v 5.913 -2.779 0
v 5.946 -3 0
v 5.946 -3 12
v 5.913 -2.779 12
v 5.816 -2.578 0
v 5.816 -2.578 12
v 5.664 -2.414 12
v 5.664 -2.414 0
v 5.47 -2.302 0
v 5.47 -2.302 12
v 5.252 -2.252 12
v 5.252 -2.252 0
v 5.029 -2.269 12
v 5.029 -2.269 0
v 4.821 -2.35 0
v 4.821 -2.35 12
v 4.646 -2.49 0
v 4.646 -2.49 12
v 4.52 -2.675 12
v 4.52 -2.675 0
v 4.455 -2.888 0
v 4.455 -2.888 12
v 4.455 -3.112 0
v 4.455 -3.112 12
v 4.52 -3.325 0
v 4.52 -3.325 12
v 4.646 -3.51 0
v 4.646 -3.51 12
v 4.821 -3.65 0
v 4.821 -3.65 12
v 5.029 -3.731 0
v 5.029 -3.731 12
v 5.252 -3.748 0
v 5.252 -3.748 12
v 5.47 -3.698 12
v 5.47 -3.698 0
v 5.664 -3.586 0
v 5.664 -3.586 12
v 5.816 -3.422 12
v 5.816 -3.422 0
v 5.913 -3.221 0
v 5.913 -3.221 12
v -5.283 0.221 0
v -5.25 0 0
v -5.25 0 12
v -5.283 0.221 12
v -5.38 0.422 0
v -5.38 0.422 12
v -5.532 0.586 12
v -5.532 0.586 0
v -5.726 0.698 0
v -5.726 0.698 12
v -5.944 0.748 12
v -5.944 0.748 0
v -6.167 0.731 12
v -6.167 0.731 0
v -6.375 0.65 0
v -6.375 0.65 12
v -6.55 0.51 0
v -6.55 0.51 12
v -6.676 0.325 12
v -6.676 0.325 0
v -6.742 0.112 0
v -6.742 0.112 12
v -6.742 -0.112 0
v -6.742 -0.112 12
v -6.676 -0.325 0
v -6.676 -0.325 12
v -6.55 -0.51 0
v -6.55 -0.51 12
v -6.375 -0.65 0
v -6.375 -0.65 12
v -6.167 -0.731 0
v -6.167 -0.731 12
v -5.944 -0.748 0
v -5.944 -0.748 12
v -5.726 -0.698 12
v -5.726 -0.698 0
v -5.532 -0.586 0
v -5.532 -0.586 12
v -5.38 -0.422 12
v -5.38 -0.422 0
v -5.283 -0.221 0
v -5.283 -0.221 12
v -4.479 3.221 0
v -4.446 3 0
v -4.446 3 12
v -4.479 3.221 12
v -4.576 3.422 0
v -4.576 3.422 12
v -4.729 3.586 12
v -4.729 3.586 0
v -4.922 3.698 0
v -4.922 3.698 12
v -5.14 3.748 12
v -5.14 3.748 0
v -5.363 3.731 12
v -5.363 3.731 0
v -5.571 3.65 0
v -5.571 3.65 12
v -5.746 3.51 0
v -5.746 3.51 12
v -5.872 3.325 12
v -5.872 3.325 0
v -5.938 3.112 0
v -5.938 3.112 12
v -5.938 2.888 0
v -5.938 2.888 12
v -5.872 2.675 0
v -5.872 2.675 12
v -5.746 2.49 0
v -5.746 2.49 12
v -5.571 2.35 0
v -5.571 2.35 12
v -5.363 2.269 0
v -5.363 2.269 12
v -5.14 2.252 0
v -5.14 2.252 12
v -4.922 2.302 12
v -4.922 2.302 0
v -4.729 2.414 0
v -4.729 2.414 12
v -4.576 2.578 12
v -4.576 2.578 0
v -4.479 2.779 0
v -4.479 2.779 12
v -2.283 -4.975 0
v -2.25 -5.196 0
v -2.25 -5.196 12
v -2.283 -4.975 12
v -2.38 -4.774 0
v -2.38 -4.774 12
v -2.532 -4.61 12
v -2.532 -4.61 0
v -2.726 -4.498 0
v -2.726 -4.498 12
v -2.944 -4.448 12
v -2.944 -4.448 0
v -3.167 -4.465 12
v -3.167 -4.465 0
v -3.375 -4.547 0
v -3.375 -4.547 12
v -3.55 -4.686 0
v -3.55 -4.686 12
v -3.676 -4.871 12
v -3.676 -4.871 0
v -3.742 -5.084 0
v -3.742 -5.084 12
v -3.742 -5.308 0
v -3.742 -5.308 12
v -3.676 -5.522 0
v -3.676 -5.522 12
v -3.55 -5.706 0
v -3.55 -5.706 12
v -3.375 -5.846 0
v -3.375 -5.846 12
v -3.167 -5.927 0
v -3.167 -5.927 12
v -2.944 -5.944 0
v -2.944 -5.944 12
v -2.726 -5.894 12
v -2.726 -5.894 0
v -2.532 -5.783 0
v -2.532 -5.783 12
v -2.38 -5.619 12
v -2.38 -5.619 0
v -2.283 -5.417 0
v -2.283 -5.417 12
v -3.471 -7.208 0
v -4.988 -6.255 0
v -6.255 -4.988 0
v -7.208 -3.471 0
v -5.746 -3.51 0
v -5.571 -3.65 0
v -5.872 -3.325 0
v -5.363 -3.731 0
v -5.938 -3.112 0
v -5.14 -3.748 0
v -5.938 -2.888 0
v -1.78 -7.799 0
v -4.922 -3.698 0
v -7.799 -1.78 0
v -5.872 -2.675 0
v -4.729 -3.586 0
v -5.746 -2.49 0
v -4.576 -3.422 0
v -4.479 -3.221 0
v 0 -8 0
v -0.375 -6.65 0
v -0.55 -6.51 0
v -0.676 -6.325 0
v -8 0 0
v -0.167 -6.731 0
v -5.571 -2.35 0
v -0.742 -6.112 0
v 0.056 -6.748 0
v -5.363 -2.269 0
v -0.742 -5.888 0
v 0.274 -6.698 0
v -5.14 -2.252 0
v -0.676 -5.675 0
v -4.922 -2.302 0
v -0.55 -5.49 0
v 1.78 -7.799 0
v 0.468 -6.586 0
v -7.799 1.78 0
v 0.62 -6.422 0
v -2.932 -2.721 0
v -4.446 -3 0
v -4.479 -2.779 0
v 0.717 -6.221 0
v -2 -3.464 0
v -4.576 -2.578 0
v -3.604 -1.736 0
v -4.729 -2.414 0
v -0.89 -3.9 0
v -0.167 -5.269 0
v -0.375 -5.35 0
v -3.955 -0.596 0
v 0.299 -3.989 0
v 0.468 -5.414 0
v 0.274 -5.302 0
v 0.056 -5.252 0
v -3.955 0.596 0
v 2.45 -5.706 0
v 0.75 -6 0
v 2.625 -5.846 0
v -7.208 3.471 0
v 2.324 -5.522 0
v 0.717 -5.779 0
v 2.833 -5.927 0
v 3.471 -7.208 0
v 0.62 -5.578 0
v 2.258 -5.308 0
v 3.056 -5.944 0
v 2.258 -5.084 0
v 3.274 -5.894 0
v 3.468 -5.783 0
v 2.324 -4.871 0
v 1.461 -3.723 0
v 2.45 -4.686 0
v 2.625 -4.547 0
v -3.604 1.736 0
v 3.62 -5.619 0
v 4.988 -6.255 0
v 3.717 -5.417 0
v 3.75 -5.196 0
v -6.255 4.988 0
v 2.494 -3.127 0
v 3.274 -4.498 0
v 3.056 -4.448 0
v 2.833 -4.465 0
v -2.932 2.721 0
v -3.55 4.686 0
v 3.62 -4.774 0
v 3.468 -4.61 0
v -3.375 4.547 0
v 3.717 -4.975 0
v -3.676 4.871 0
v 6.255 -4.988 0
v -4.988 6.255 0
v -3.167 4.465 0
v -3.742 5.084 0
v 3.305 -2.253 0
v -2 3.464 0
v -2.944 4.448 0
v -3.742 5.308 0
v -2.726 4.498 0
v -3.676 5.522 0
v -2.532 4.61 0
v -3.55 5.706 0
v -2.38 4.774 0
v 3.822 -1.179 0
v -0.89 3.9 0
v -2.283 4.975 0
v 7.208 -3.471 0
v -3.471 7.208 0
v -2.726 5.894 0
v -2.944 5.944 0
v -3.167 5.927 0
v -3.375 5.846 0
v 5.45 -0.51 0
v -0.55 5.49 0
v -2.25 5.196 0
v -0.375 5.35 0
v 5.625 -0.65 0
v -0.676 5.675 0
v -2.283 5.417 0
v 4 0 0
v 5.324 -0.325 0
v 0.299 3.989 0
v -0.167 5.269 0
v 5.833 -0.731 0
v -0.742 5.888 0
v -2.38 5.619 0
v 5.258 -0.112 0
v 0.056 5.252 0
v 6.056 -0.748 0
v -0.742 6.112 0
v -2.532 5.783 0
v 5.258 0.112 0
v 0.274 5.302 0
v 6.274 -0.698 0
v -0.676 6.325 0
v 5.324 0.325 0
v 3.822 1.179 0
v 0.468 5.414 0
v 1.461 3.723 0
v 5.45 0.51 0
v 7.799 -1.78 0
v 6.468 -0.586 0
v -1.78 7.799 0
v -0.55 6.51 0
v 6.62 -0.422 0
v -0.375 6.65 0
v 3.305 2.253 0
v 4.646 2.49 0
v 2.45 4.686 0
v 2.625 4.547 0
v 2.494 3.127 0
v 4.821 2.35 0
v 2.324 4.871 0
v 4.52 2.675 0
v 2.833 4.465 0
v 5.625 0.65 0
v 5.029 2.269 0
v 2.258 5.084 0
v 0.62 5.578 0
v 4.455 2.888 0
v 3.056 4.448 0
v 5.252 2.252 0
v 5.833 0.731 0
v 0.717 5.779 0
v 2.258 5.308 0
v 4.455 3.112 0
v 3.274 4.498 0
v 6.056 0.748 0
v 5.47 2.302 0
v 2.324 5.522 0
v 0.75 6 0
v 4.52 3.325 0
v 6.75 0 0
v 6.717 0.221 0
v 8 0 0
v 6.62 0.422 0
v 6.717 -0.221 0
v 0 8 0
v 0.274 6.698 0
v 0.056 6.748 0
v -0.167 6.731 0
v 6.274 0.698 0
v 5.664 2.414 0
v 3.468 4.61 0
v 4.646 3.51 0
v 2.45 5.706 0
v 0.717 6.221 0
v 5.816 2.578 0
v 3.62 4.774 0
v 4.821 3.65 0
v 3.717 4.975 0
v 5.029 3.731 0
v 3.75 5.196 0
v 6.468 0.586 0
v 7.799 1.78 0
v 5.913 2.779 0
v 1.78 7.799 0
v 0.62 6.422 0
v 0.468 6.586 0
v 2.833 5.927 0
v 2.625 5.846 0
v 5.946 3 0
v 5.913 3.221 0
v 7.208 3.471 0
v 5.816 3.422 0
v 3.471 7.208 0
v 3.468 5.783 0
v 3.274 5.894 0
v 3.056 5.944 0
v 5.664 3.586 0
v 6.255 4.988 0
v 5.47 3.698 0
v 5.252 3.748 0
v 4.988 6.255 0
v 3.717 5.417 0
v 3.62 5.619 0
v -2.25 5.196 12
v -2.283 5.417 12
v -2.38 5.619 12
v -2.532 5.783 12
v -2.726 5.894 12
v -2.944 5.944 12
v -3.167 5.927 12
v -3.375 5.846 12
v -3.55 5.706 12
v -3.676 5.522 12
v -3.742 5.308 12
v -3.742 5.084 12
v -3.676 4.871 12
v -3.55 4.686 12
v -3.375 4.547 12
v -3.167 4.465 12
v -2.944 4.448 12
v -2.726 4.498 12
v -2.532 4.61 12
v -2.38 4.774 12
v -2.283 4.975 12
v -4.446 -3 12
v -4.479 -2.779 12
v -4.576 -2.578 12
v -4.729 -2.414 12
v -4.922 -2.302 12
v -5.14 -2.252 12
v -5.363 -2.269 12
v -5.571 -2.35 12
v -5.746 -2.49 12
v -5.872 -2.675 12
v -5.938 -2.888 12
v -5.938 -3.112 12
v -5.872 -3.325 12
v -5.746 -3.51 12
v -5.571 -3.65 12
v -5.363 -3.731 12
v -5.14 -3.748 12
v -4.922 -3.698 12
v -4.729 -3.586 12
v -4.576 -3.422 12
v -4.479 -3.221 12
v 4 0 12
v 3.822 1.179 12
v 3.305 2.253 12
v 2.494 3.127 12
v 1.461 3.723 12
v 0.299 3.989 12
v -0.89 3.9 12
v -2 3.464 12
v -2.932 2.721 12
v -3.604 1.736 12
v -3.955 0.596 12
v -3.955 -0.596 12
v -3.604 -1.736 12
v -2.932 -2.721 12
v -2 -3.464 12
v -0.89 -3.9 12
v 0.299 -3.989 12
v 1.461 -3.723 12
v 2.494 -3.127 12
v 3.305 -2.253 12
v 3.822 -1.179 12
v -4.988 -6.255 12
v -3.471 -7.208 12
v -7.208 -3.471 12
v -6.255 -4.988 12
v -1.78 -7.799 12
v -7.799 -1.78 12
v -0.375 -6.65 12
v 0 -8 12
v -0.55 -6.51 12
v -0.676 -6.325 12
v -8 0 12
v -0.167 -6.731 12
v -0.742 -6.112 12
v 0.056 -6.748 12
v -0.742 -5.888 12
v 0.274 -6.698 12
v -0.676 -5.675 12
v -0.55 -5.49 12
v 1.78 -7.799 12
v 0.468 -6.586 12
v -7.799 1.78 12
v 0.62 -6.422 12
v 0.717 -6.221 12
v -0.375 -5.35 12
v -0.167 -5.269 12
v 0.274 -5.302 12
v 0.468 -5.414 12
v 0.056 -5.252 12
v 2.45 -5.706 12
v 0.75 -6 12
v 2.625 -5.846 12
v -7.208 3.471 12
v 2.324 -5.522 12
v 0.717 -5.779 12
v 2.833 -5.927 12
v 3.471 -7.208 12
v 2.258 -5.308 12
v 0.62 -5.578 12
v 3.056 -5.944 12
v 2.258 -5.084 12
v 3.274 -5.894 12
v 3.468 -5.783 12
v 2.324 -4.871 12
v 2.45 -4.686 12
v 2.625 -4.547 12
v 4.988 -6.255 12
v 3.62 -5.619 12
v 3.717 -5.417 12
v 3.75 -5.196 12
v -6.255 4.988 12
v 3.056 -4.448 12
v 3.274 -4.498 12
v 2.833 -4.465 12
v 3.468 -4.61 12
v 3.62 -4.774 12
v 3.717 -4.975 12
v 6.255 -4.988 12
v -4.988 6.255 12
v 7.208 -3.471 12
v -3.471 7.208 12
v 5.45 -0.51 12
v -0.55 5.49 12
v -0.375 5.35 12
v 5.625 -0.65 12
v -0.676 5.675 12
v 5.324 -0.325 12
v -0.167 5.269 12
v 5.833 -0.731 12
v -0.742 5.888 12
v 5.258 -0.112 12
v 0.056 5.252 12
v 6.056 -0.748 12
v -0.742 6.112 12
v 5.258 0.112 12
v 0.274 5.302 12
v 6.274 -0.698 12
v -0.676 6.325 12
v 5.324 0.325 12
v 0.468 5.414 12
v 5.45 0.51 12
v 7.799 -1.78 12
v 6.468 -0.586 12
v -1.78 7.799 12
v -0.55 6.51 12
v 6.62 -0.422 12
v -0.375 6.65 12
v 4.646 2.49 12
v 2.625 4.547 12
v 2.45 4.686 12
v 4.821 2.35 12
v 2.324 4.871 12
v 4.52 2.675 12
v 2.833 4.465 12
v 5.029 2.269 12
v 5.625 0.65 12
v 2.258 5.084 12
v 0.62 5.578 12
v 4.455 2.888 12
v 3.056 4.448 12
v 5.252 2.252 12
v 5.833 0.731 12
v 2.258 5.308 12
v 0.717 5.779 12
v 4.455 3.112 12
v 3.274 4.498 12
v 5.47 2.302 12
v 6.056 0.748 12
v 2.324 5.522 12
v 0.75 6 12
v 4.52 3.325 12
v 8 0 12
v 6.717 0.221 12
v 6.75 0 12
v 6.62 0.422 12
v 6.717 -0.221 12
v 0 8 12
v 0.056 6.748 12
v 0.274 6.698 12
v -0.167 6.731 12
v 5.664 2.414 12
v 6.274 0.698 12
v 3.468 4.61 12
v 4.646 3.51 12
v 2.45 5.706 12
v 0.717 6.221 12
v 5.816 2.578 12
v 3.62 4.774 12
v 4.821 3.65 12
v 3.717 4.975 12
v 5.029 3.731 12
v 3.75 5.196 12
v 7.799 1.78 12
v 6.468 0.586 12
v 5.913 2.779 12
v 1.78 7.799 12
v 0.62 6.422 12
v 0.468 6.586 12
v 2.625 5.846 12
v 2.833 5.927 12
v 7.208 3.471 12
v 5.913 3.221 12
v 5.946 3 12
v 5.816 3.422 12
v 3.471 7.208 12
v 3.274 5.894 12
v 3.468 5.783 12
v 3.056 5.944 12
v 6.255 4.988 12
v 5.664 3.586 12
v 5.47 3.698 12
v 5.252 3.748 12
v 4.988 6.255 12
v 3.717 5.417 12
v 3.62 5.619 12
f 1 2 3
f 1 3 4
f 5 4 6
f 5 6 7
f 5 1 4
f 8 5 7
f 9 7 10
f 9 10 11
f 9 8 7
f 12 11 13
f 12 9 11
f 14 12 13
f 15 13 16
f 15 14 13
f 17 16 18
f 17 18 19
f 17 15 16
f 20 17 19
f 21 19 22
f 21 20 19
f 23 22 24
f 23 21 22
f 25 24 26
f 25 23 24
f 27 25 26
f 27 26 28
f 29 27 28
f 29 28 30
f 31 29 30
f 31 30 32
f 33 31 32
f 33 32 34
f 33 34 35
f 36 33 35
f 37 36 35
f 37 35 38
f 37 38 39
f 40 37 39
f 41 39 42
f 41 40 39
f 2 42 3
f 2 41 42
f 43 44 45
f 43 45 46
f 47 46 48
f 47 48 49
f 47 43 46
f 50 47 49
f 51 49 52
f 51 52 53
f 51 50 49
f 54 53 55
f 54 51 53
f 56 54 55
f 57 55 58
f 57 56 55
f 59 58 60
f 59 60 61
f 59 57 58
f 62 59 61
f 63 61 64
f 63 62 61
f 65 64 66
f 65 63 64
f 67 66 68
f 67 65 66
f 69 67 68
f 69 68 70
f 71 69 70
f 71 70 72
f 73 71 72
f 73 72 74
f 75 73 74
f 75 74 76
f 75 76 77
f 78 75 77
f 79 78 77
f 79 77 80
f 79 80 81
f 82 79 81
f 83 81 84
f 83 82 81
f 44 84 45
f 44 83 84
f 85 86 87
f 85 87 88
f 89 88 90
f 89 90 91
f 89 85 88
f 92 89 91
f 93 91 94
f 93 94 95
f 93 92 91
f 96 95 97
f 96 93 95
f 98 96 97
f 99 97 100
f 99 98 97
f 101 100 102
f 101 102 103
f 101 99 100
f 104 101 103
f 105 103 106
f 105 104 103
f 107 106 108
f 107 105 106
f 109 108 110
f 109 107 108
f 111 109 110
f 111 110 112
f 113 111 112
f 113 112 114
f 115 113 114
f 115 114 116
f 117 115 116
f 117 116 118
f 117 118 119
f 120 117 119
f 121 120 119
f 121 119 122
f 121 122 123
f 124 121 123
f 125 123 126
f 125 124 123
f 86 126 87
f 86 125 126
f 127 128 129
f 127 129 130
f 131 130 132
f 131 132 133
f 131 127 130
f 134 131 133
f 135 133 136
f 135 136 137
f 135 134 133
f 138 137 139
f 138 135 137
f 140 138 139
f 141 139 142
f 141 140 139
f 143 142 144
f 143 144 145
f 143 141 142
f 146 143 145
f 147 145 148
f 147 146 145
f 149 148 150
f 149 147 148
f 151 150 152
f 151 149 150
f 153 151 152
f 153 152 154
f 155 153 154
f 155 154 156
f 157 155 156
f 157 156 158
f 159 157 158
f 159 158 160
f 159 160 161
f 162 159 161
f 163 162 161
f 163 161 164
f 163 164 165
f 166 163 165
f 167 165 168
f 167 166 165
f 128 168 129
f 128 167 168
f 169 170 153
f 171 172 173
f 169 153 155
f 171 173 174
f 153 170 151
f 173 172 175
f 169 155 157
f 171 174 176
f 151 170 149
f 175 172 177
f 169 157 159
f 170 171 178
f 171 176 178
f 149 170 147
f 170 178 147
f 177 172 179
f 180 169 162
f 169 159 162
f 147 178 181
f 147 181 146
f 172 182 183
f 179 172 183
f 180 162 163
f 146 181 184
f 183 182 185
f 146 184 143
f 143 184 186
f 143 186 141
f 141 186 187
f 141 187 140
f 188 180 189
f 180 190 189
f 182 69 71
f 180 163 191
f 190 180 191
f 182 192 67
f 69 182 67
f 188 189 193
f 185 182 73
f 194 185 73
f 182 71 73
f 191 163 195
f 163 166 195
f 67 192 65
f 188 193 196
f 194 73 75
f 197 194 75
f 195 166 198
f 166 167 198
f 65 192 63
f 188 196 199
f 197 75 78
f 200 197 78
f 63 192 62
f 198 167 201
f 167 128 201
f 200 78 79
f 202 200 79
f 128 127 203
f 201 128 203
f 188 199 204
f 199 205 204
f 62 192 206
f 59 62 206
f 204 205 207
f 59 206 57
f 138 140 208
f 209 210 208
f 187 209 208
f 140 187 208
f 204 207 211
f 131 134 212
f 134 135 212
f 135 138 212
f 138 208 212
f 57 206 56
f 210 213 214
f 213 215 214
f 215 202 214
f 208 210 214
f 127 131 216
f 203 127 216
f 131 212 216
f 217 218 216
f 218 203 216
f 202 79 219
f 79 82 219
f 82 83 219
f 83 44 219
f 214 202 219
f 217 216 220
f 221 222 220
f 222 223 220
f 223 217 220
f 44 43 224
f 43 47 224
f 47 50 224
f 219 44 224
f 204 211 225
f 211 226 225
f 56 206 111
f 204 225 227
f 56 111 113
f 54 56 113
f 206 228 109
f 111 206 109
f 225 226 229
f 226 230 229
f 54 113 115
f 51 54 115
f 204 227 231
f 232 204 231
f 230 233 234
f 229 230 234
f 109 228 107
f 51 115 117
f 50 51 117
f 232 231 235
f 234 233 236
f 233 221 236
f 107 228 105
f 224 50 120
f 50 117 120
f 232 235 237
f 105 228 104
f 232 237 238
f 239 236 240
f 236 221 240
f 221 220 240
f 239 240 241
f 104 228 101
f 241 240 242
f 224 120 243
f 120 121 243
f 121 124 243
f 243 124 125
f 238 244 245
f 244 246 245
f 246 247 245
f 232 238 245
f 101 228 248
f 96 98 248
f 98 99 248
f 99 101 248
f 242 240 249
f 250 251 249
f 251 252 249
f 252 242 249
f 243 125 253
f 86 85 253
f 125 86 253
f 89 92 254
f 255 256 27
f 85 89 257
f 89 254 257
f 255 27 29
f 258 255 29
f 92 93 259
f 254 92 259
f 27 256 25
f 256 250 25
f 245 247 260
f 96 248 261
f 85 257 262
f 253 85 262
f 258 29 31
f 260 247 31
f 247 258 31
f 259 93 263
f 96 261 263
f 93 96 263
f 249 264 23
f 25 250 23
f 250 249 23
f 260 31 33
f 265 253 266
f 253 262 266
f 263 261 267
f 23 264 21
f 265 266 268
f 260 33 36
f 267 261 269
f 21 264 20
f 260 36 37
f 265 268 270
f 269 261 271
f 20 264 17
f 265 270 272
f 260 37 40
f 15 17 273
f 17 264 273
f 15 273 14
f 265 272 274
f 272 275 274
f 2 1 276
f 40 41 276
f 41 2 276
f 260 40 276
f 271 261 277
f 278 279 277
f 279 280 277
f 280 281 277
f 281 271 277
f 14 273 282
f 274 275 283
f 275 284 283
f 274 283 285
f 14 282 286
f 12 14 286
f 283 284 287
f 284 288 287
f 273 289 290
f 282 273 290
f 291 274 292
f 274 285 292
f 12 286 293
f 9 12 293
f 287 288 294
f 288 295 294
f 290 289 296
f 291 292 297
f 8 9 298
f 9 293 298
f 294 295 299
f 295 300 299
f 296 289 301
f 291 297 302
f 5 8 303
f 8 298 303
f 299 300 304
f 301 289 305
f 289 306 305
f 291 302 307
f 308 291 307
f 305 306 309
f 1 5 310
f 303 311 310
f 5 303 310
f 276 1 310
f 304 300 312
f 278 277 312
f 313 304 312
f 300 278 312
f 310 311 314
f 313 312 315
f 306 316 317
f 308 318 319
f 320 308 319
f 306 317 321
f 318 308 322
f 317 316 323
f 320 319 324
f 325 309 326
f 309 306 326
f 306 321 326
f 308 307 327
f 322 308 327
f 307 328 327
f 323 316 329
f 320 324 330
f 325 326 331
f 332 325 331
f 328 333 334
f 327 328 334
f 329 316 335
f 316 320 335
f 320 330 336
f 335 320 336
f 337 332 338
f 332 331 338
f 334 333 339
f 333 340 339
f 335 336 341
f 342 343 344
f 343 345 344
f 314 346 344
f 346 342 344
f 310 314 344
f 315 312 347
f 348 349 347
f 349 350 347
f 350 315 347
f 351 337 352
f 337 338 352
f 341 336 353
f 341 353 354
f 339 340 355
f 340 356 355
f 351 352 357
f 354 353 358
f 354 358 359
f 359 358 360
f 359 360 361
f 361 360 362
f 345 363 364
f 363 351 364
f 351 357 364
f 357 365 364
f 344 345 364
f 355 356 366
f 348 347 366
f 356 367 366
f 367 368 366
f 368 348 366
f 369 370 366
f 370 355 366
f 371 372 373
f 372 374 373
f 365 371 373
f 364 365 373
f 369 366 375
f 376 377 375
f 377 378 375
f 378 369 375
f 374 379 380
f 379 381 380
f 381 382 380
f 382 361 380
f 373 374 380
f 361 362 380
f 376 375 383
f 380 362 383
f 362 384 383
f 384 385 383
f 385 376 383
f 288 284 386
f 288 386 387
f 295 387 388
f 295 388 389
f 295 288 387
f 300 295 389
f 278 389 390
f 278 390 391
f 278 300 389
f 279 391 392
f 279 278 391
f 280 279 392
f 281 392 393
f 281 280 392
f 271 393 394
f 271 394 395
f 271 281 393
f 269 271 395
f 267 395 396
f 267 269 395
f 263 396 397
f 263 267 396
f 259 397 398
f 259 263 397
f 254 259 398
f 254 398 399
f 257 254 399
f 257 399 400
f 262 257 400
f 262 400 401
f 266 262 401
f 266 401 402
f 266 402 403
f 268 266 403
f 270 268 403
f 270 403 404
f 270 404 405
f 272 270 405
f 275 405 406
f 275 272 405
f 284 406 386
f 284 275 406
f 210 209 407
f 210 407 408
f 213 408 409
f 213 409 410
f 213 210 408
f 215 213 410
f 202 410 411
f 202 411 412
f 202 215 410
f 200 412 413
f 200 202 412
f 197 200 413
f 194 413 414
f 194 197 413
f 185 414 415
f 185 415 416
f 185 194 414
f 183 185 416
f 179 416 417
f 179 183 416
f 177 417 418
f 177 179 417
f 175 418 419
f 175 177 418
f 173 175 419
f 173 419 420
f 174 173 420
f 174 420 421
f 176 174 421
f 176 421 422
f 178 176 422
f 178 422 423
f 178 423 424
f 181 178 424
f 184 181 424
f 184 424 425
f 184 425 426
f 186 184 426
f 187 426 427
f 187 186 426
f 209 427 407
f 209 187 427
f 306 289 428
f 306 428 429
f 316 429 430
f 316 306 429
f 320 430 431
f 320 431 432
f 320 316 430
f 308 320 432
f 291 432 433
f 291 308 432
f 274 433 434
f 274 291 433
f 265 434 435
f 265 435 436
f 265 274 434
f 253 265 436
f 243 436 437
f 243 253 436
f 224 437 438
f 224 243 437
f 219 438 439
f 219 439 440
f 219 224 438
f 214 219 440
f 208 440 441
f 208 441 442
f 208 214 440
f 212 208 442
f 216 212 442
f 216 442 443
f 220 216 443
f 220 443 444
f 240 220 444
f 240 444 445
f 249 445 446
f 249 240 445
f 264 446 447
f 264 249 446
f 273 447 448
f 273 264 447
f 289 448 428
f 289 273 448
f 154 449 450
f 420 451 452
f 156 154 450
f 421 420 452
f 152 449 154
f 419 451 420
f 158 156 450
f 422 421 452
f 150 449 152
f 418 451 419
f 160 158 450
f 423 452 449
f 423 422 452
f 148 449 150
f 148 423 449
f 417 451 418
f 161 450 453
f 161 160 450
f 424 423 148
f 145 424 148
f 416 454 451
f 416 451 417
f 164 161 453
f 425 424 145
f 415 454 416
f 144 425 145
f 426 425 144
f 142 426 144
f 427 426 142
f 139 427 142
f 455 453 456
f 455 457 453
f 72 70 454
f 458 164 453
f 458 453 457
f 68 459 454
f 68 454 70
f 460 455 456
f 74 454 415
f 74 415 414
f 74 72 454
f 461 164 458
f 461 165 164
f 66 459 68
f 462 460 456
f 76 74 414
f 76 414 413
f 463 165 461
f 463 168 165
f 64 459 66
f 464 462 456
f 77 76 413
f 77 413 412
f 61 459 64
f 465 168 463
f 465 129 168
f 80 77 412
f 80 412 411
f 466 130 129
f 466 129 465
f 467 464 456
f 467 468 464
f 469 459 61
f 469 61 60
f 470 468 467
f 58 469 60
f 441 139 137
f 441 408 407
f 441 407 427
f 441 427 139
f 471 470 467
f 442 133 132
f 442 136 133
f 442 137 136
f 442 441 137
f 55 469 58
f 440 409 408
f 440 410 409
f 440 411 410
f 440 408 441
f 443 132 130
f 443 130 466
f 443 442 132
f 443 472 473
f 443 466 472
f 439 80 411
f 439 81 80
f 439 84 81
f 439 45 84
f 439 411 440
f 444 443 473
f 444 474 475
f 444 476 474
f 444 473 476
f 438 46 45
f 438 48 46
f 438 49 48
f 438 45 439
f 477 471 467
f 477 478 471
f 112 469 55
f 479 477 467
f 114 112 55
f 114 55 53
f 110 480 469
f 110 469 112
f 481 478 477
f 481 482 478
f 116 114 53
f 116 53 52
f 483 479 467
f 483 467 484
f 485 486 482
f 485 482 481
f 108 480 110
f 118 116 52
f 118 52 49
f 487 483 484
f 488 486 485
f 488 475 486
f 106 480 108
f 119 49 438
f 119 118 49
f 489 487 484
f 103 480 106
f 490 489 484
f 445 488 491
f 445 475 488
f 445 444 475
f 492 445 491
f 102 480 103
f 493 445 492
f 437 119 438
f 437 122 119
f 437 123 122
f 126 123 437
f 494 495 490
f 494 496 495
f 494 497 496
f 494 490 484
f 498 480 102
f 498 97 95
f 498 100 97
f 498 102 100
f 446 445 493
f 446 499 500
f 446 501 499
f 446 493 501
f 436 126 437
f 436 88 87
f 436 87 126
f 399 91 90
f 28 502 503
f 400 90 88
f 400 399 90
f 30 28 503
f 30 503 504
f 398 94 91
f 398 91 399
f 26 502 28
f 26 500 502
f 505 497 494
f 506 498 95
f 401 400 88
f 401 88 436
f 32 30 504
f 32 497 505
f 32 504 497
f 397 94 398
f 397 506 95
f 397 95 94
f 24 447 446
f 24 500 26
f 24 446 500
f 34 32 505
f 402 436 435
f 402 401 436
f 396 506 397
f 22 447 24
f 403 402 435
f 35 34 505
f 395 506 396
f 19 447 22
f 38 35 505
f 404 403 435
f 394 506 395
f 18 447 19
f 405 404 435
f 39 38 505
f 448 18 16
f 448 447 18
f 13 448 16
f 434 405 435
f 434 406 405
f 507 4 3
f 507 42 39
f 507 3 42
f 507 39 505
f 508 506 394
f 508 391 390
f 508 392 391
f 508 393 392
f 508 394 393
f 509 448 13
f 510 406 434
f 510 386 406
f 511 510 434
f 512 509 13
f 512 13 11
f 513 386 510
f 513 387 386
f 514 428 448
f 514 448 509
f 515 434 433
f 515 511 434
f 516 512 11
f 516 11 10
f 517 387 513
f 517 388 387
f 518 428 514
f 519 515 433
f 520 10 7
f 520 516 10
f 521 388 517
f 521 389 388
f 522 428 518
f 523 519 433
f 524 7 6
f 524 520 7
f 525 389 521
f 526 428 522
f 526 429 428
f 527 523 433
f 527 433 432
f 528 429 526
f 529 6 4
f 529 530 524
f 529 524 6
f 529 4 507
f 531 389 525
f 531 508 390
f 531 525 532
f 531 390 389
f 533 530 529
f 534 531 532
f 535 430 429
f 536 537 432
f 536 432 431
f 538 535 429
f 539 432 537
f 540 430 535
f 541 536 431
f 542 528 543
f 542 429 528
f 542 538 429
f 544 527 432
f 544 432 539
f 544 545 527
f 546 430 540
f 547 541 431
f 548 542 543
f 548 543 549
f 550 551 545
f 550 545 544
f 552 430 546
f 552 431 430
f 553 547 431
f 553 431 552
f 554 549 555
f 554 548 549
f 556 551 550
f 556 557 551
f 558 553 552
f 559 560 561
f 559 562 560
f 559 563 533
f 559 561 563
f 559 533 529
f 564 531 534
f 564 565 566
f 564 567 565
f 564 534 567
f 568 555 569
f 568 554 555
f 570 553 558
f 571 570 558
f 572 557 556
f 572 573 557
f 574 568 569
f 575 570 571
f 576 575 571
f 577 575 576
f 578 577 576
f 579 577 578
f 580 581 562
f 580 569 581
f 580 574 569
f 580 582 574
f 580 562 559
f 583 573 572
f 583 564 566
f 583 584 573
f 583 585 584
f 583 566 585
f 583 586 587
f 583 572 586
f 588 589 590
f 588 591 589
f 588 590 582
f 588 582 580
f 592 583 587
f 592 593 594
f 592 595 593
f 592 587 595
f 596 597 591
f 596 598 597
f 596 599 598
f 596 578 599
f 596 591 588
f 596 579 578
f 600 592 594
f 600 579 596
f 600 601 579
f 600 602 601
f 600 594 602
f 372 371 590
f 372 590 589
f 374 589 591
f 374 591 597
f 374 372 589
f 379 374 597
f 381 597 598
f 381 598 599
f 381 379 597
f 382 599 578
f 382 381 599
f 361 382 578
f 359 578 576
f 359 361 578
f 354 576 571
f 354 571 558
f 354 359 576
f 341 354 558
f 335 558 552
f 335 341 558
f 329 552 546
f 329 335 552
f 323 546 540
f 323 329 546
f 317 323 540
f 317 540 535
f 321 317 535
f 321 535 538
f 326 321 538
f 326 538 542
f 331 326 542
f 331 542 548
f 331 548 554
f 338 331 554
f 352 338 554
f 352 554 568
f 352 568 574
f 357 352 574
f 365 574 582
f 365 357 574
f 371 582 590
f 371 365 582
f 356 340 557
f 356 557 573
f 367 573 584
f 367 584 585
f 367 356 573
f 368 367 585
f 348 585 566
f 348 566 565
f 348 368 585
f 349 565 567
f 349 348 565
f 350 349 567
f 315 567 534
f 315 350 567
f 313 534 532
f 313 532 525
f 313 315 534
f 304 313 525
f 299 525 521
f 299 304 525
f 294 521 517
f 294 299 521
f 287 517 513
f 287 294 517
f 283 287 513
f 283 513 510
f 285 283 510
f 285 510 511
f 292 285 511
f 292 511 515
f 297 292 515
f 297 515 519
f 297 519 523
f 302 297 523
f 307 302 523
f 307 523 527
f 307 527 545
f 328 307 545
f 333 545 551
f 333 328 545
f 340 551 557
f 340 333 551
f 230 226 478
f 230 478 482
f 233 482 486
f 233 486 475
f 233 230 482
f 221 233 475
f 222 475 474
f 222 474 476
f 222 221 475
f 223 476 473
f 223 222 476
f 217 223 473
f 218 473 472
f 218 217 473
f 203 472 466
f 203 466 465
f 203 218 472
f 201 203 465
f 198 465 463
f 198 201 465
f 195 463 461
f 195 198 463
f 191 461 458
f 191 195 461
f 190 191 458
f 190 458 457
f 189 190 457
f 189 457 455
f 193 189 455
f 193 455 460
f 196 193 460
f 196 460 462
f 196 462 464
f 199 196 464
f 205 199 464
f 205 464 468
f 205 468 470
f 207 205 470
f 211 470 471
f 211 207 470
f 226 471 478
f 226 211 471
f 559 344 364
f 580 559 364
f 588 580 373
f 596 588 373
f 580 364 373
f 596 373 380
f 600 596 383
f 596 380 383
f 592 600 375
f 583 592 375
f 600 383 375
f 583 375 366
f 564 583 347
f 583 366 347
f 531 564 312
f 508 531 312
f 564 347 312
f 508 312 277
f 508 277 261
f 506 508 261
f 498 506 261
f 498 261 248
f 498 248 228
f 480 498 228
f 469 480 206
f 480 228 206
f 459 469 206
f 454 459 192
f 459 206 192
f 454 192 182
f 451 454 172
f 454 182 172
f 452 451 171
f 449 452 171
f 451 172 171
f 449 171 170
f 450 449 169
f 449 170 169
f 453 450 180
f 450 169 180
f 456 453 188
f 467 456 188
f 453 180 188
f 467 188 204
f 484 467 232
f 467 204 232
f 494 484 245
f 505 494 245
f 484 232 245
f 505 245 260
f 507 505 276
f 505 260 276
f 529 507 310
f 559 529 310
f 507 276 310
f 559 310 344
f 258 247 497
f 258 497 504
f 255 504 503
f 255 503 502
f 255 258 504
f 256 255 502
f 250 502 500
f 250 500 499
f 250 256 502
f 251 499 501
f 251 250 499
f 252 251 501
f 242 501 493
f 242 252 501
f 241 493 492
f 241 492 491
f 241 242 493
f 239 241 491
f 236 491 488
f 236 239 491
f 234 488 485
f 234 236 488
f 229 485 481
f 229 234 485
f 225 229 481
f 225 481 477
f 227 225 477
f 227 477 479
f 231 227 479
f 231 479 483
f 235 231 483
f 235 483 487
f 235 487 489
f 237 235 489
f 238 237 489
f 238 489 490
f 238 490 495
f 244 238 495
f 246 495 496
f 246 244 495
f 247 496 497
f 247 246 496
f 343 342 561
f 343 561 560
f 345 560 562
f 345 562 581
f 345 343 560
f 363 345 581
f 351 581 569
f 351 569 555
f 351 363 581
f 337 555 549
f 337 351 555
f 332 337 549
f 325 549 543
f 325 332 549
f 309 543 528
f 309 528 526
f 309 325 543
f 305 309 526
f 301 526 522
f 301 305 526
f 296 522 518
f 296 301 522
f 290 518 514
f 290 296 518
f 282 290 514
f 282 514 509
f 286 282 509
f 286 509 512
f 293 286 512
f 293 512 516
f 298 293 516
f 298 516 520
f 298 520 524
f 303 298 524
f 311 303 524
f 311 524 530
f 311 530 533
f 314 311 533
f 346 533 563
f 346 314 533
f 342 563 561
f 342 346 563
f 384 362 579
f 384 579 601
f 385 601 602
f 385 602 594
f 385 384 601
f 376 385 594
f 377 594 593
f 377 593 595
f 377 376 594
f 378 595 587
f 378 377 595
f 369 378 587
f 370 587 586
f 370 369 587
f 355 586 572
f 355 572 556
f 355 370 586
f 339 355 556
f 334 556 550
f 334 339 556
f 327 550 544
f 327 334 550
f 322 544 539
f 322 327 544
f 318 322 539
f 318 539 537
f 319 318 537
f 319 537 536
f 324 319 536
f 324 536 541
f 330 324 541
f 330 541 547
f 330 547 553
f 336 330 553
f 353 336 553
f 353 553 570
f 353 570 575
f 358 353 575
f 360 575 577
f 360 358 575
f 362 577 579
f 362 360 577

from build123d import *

# Parameters (mm, degrees)
SKETCH_1_R      = 8
SKETCH_1_R_2    = 0.75
SKETCH_1_R_3    = 4
EXTRUDE_1_DEPTH = 12


with BuildPart() as part:
    # 草图1 → 凸台-拉伸1 (new body)
    with BuildSketch(Plane.XY):
        Circle(SKETCH_1_R)
        with Locations((6, 0)):
            Circle(SKETCH_1_R_2, mode=Mode.SUBTRACT)
        with Locations((5.196152423, -3)):
            Circle(SKETCH_1_R_2, mode=Mode.SUBTRACT)
        with Locations((3, -5.196152423)):
            Circle(SKETCH_1_R_2, mode=Mode.SUBTRACT)
        with Locations((0, -6)):
            Circle(SKETCH_1_R_2, mode=Mode.SUBTRACT)
        with Locations((-3, -5.196152423)):
            Circle(SKETCH_1_R_2, mode=Mode.SUBTRACT)
        with Locations((-5.196152423, -3)):
            Circle(SKETCH_1_R_2, mode=Mode.SUBTRACT)
        with Locations((-6, 0)):
            Circle(SKETCH_1_R_2, mode=Mode.SUBTRACT)
        with Locations((-5.196152423, 3)):
            Circle(SKETCH_1_R_2, mode=Mode.SUBTRACT)
        with Locations((-3, 5.196152423)):
            Circle(SKETCH_1_R_2, mode=Mode.SUBTRACT)
        with Locations((0, 6)):
            Circle(SKETCH_1_R_2, mode=Mode.SUBTRACT)
        with Locations((3, 5.196152423)):
            Circle(SKETCH_1_R_2, mode=Mode.SUBTRACT)
        with Locations((5.196152423, 3)):
            Circle(SKETCH_1_R_2, mode=Mode.SUBTRACT)
        Circle(SKETCH_1_R_3, mode=Mode.SUBTRACT)
    extrude(amount=EXTRUDE_1_DEPTH)


solid = part.part
